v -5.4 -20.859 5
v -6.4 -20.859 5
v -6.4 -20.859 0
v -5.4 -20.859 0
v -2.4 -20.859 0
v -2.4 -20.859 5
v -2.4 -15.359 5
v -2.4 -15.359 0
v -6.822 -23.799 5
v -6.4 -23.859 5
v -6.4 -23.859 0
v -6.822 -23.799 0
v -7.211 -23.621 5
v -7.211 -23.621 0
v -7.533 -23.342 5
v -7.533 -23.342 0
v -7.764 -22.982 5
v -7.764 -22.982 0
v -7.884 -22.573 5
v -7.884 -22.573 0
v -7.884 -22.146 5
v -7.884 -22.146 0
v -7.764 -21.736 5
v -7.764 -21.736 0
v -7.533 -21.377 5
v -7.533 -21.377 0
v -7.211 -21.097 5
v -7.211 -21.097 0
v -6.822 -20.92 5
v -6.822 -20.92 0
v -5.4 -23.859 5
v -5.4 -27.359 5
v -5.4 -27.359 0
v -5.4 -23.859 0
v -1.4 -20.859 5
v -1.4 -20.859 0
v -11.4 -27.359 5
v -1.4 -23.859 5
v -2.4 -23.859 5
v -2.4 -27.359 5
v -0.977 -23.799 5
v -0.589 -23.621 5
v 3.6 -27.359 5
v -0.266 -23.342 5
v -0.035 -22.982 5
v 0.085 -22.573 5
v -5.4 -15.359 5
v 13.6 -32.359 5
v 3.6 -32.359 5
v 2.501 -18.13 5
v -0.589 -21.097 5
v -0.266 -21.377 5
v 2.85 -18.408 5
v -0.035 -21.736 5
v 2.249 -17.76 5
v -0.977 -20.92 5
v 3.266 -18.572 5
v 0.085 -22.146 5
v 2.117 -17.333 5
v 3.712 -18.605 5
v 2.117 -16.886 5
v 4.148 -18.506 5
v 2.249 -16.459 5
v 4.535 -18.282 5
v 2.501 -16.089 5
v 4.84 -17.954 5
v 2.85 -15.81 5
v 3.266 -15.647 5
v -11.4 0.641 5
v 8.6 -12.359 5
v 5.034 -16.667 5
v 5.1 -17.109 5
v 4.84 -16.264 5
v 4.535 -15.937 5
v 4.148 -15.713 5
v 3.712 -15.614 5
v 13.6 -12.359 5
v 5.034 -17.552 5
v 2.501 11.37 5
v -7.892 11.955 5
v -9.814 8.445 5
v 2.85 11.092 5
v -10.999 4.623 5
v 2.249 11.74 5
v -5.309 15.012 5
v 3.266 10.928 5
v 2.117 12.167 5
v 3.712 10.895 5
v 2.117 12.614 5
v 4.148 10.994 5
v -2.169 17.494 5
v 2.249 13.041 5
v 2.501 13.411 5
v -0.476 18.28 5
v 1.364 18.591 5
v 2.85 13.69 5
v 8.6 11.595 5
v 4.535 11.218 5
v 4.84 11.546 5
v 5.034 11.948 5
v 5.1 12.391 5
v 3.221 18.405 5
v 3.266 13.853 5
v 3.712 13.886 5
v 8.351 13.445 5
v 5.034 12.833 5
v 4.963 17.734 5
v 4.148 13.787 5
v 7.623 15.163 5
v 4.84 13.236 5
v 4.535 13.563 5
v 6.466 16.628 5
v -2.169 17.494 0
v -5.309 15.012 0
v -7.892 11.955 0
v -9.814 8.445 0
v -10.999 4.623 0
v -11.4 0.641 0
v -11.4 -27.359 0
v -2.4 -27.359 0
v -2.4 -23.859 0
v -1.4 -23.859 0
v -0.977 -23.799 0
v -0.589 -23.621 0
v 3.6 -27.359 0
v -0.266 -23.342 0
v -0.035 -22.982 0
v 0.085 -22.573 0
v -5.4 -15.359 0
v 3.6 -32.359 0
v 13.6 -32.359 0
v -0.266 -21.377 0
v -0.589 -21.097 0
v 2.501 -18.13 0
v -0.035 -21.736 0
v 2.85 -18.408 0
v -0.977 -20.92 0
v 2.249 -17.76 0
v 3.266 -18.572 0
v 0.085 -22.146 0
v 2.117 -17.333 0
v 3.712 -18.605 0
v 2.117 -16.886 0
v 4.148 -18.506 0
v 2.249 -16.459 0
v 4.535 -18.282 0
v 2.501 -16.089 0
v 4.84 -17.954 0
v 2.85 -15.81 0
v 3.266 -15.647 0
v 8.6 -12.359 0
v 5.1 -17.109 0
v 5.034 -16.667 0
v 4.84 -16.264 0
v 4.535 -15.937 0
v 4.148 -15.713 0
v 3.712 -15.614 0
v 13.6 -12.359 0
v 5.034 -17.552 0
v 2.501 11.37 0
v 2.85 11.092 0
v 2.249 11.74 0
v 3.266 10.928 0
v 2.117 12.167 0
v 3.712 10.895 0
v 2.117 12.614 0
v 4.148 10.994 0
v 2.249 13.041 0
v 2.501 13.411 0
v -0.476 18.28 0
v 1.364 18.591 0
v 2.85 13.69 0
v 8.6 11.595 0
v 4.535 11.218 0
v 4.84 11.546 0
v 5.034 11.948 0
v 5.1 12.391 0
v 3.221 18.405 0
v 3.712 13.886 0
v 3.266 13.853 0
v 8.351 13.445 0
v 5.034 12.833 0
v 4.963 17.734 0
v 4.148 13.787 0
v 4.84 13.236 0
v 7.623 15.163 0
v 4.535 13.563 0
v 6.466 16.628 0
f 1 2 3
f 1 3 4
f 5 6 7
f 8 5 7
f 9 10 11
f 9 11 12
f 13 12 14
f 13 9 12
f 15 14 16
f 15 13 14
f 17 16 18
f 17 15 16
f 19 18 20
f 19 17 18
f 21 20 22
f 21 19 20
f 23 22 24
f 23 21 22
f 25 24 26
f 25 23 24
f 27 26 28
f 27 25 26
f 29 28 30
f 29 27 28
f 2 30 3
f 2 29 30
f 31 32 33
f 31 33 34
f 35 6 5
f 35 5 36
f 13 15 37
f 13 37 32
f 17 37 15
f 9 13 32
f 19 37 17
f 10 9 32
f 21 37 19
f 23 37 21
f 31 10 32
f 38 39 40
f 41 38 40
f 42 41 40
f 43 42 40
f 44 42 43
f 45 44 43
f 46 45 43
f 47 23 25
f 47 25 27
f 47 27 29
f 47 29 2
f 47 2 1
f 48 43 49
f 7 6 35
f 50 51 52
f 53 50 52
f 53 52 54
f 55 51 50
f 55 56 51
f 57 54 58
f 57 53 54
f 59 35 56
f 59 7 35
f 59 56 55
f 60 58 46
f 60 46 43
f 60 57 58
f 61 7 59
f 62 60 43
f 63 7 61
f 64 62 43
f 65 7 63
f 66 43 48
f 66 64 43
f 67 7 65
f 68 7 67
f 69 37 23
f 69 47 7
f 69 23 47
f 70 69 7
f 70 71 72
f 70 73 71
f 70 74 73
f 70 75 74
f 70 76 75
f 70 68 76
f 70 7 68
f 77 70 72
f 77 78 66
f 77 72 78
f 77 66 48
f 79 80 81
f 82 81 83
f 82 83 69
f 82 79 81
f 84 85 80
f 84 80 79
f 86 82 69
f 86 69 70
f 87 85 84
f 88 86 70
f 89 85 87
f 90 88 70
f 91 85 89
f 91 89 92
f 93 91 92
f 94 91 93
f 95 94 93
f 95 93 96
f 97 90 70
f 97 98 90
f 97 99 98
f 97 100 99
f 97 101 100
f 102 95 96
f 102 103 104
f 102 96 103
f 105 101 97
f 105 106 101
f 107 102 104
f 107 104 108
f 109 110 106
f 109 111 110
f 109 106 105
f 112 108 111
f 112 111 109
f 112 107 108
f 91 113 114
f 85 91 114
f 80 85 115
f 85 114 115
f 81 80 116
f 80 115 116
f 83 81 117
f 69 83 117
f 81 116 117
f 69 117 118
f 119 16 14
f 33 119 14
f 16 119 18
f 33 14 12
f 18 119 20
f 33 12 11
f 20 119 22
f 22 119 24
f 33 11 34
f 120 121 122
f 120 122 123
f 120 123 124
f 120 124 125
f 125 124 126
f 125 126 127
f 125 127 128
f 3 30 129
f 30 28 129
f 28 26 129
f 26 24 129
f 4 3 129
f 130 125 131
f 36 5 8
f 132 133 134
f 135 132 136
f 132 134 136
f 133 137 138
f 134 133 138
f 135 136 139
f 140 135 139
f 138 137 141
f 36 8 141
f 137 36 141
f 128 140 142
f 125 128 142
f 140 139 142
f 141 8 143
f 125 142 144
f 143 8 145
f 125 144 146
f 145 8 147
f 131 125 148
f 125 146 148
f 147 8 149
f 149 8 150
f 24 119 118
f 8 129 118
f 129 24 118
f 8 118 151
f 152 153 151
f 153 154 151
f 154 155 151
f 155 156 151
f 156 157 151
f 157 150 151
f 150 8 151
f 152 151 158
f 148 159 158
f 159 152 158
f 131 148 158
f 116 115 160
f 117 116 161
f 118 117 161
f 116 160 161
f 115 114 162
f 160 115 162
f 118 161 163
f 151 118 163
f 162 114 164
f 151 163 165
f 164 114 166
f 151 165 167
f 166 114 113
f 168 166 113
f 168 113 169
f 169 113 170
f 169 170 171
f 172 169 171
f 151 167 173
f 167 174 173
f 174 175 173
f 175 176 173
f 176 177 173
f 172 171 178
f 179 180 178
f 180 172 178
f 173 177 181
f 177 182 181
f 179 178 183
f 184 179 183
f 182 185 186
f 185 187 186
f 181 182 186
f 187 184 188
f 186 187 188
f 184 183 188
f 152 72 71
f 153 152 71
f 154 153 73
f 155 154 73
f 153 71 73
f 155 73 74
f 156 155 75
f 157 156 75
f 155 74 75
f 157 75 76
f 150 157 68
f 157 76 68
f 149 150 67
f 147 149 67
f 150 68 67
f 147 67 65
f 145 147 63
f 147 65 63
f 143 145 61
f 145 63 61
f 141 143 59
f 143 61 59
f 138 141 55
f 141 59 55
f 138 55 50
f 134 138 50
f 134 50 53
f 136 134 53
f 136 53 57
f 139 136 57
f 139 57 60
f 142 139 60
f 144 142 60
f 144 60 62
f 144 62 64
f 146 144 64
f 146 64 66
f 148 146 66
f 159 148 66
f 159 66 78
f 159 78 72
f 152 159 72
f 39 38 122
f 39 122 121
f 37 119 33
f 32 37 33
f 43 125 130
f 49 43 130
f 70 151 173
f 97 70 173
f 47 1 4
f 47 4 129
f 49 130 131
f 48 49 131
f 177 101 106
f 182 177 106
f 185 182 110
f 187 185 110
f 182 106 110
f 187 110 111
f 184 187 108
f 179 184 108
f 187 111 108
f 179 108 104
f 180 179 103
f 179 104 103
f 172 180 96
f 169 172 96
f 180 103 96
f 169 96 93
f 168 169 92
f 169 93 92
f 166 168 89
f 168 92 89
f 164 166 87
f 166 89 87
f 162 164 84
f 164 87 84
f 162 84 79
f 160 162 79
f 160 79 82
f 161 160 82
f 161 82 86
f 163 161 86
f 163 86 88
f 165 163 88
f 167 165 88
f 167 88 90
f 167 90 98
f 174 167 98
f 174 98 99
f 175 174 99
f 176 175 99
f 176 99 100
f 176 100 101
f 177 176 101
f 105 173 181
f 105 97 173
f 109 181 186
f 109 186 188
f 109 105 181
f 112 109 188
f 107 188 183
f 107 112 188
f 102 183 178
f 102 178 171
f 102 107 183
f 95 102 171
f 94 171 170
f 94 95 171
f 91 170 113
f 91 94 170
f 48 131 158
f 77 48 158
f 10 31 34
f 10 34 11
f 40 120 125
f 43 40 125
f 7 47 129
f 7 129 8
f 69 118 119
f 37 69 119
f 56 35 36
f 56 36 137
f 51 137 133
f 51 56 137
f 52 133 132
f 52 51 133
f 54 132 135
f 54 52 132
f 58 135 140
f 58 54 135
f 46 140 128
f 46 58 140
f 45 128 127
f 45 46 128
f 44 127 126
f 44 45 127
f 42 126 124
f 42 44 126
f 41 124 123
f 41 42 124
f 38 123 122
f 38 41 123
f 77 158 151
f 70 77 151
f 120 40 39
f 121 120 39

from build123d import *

# Parameters (mm, degrees)
BOSS_EXTRUDE1_DEPTH = 5
SKETCH2_W           = 3
SKETCH2_H           = 12
CUT_EXTRUDE1_DEPTH  = 10
FILLET1_R           = 7
SKETCH3_R           = 1.5
CUT_EXTRUDE2_DEPTH  = 10


with BuildPart() as part:
    # Sketch1 → Boss-Extrude1 (new body)
    with BuildSketch(Plane.XY):
        with BuildLine():
            Line((13.600261452, -32.359372515), (13.600261452, -12.359372515))
            Line((13.600261452, -12.359372515), (8.600261452, -12.359372515))
            Line((8.600261452, -12.359372515), (8.600261452, 20.640627485))
            ThreePointArc((8.600261452, 20.640627485), (-5.541874172, 14.782763108), (-11.399738548, 0.640627485))
            Line((-11.399738548, 0.640627485), (-11.399738548, -27.359372515))
            Line((-11.399738548, -27.359372515), (3.600261452, -27.359372515))
            Line((3.600261452, -27.359372515), (3.600261452, -32.359372515))
            Line((3.600261452, -32.359372515), (13.600261452, -32.359372515))
        make_face()
    extrude(amount=BOSS_EXTRUDE1_DEPTH)

    # Sketch2 → Cut-Extrude1 (cut)
    with BuildSketch(Plane.XY.offset(5)):
        with Locations((-3.899738548, -21.359372515)):
            Rectangle(SKETCH2_W, SKETCH2_H)
        with BuildLine():
            Line((-6.399738548, -20.859372515), (-1.399738548, -20.859372515))
            ThreePointArc((-1.399738548, -20.859372515), (0.100261452, -22.359372515), (-1.399738548, -23.859372515))
            Line((-1.399738548, -23.859372515), (-6.399738548, -23.859372515))
            ThreePointArc((-6.399738548, -23.859372515), (-7.899738548, -22.359372515), (-6.399738548, -20.859372515))
        make_face()
    extrude(amount=-CUT_EXTRUDE1_DEPTH, mode=Mode.SUBTRACT)

    # Fillet1
    fillet1_edges = [part.edges().sort_by_distance(p)[0] for p in [
        (8.600261452, 20.640627485, 2.5),
    ]]
    fillet(fillet1_edges, radius=FILLET1_R)

    # Sketch3 → Cut-Extrude2 (cut)
    with BuildSketch(Plane.XY.offset(5)):
        with Locations((3.600261452, -17.109372515)):
            Circle(SKETCH3_R)
        with Locations((3.600261452, 12.390627485)):
            Circle(SKETCH3_R)
    extrude(amount=-CUT_EXTRUDE2_DEPTH, mode=Mode.SUBTRACT)


solid = part.part
